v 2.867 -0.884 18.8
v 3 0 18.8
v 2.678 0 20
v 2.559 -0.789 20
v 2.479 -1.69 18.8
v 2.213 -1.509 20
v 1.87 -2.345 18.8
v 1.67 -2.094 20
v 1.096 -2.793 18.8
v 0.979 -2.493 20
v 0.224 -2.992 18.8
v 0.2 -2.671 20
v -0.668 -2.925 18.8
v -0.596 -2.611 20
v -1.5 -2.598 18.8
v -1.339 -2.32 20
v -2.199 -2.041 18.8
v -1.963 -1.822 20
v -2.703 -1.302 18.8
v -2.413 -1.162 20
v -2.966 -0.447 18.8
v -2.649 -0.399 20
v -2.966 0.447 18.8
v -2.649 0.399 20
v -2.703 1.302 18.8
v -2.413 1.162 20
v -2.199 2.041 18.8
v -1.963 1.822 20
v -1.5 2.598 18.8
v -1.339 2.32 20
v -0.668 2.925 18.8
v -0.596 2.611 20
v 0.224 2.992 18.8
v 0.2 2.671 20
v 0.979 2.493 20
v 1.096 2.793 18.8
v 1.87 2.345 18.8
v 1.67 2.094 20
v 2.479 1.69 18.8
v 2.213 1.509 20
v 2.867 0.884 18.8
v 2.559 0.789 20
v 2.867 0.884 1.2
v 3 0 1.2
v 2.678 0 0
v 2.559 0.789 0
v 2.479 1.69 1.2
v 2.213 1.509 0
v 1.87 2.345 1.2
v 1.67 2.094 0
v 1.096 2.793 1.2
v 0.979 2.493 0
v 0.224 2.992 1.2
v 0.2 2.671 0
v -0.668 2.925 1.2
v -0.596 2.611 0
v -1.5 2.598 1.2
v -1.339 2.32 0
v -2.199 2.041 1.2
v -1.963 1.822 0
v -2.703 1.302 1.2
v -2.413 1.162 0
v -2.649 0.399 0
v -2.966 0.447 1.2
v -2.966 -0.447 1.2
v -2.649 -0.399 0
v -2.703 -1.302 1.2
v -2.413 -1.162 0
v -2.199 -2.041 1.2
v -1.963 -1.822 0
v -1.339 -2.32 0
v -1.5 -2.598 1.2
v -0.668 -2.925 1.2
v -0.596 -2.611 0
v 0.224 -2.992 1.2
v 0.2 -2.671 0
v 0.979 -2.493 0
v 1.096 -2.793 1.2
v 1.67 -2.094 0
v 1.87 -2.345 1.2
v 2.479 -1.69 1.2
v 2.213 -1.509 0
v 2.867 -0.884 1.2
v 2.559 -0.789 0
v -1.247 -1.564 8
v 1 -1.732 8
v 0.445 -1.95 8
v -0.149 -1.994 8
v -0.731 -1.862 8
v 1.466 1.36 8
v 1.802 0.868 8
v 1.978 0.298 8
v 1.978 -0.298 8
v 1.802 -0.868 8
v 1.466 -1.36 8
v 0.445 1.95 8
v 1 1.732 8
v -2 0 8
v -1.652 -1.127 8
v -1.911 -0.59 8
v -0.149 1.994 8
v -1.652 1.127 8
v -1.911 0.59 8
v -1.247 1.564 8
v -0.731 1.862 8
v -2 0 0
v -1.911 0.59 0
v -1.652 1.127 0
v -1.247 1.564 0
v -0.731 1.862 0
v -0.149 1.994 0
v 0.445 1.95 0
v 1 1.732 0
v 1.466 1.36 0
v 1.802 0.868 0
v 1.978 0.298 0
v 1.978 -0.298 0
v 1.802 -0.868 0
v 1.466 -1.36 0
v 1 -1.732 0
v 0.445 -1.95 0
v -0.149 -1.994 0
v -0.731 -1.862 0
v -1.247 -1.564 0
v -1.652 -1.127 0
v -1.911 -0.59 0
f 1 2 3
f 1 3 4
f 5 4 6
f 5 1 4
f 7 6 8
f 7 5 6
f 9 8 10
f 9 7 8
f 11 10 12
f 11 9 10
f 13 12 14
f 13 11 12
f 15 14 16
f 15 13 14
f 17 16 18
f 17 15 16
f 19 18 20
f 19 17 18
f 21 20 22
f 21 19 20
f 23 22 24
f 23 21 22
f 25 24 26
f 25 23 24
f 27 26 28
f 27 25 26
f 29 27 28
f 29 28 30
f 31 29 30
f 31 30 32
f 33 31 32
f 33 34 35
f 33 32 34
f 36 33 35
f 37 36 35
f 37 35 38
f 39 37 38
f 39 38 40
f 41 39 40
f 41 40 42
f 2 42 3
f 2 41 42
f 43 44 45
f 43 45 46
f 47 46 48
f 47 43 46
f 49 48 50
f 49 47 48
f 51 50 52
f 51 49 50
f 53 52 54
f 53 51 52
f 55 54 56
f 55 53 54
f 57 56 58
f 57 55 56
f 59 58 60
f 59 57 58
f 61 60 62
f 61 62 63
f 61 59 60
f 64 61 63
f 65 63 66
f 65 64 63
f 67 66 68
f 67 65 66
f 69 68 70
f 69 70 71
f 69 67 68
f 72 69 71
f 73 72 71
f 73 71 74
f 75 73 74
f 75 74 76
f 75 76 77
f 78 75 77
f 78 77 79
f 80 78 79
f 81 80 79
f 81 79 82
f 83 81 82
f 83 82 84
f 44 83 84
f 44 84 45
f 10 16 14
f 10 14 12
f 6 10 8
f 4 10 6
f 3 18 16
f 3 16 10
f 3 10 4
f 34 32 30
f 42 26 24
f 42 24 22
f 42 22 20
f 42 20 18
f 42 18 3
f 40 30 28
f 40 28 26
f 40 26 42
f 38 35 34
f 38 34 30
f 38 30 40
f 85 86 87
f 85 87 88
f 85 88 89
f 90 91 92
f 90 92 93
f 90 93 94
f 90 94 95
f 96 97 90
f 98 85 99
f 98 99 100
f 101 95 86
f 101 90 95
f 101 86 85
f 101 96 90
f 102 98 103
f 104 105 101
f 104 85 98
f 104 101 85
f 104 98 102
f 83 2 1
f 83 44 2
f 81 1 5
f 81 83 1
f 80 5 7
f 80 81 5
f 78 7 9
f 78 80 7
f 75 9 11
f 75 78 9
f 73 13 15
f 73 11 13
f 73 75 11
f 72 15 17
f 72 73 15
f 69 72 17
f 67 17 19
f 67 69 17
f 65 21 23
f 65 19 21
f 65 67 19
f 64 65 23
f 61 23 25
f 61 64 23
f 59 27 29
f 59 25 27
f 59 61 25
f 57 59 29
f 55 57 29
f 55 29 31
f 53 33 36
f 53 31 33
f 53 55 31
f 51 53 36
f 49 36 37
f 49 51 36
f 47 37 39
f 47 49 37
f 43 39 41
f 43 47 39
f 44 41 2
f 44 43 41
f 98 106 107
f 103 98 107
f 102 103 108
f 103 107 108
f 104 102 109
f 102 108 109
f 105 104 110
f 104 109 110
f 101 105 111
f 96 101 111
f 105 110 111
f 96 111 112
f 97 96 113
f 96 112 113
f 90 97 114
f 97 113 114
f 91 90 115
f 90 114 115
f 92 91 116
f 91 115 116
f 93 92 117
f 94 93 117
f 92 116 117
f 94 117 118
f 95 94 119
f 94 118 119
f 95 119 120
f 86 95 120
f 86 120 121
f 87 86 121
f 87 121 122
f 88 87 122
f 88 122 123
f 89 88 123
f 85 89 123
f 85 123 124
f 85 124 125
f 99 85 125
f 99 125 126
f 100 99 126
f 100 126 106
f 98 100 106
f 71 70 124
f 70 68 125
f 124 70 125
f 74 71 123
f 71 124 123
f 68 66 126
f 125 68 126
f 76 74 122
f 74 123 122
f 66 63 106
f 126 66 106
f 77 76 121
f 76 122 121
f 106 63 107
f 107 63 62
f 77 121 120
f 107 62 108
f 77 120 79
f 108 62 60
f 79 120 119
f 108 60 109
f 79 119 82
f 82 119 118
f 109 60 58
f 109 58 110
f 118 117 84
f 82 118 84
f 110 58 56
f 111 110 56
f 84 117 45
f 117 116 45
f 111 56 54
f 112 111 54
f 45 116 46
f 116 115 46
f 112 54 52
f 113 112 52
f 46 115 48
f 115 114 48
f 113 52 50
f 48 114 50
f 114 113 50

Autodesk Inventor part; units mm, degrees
ref_plane "YZ Plane" through (0, 0, 0) normal (1, 0, 0) x (0, 1, 0)
ref_plane "XZ Plane" through (0, 0, 0) normal (0, 1, 0) x (-1, 0, 0)
ref_plane "XY Plane" through (0, 0, 0) normal (0, 0, 1) x (1, 0, 0)
sketch "スケッチ1" plane through (0, 0, 0) normal (0, 0, 1) x (1, 0, 0)
  circle A0 centre (0, 0) radius 3
  dimension "d0" = 6
extrude "押し出し1" add sketch "スケッチ1" along normal blind 20
chamfer "面取り1" distance 1.2 angle 15 2 edges at (-3, 0, 20) (-3, 0, 0) measured on face at (2.9612, -0.4812, 13.3333)
sketch "スケッチ2" plane through (0, 0, 0) normal (0, 0, -1) x (-1, 0, 0)
  circle A0 centre (0, 0) radius 2
  dimension "d6" = 4
extrude "押し出し2" cut sketch "スケッチ2" against normal blind 8
properties part number "平行ピンΦ6.20 片雌ネジ" material "鋼、高強度、低合金"
